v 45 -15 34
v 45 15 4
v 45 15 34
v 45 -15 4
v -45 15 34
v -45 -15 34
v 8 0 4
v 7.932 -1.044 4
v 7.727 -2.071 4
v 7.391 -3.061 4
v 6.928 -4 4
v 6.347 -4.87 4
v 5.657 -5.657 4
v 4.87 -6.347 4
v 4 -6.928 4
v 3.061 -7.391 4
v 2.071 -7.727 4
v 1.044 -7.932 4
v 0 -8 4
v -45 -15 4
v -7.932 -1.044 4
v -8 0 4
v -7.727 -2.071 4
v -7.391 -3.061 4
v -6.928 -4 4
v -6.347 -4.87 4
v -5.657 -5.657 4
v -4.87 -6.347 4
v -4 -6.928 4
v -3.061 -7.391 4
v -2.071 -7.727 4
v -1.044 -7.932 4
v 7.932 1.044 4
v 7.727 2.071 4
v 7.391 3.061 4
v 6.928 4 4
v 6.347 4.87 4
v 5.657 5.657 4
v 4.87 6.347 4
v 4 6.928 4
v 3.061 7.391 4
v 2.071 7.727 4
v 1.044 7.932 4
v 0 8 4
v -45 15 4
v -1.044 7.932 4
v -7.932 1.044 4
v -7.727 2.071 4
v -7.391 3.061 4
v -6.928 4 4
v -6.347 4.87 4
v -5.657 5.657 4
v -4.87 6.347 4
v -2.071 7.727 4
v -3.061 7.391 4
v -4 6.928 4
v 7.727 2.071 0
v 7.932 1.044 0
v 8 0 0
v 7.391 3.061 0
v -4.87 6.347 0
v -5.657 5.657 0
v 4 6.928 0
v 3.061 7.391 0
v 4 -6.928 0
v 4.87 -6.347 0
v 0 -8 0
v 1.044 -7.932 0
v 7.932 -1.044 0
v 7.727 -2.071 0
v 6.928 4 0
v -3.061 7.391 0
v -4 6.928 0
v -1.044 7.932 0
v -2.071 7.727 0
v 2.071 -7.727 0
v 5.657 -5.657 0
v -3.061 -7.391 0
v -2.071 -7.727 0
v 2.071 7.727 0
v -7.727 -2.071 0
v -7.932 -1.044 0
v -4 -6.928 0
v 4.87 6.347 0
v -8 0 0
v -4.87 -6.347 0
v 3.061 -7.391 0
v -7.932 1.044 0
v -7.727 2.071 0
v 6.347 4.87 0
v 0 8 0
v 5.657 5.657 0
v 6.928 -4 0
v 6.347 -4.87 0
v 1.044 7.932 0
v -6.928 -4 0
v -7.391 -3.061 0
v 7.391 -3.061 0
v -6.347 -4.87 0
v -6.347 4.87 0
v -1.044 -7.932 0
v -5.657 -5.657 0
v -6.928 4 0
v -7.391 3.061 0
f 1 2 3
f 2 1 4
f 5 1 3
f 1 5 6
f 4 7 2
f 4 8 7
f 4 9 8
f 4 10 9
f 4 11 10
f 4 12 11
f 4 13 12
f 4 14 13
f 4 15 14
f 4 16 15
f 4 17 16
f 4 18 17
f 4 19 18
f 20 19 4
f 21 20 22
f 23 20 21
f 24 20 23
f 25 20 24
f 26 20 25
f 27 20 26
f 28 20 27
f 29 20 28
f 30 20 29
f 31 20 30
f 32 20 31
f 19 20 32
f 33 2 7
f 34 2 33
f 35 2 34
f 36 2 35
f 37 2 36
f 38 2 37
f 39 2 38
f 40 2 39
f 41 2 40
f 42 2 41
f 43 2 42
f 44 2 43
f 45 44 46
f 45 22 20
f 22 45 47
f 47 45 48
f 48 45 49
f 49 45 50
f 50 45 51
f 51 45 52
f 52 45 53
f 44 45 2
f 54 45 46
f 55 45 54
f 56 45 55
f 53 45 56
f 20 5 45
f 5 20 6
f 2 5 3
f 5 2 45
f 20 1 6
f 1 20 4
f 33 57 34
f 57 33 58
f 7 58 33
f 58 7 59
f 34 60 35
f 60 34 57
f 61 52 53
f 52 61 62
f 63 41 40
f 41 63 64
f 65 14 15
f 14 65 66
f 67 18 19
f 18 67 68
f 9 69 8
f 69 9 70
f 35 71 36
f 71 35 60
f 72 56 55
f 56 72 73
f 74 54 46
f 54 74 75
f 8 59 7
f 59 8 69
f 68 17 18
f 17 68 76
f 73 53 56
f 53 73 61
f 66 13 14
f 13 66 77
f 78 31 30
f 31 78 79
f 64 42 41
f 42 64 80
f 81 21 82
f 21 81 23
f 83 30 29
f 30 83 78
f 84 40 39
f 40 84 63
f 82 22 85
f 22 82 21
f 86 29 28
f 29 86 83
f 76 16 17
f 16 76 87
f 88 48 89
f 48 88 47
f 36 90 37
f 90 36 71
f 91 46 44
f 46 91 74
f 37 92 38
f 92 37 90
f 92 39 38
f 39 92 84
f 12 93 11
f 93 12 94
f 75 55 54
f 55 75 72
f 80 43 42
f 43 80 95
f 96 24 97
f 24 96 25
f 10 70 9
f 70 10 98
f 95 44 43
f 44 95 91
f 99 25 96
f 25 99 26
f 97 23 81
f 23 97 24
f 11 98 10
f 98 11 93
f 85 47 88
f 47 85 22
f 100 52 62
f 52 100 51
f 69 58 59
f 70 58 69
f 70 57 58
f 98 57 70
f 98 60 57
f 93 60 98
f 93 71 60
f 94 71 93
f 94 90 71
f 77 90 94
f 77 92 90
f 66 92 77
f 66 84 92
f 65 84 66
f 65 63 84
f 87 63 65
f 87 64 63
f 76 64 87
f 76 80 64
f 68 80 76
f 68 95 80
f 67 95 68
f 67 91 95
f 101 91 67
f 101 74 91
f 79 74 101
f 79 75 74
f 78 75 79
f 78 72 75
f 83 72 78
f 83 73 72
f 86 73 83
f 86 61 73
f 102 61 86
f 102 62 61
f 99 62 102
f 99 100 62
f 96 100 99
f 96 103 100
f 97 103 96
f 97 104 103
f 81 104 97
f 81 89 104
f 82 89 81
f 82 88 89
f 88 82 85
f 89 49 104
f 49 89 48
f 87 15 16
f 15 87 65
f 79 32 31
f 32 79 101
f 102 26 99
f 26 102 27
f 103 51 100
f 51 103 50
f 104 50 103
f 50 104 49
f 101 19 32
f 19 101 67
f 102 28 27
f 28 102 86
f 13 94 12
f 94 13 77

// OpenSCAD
// file: ../webcam/webcam.scad
// A bare webcam: a body and its lens, nothing to stand it on. Drawn looking
// straight down, as a camera added to a site first stands: the middle of the
// lens's front face is the origin, at z = 0, and the body is above it. Its
// long side runs across the picture it takes (+x); the picture's top is +y.
// A camera in a site is this, tilted from straight down about its long side
// and turned about the vertical (apothecary/vision/cameras.py).

body = [90, 30, 30];   // across the picture, up the picture, lens to back
lens_d = 16;           // the lens's diameter
lens_h = 4;            // how far the lens stands out of the body

module webcam() {
    color("dimgray") translate([-body[0] / 2, -body[1] / 2, lens_h]) cube(body);
    color("black") cylinder(d = lens_d, h = lens_h, $fn = 48);
}

webcam();
// main file
// A stub: a webcam on a clamp arm -- a clamp for a bench's edge and a jointed
// arm, the webcam at its end. Only the webcam is drawn for now.

include <../webcam/webcam.scad>
